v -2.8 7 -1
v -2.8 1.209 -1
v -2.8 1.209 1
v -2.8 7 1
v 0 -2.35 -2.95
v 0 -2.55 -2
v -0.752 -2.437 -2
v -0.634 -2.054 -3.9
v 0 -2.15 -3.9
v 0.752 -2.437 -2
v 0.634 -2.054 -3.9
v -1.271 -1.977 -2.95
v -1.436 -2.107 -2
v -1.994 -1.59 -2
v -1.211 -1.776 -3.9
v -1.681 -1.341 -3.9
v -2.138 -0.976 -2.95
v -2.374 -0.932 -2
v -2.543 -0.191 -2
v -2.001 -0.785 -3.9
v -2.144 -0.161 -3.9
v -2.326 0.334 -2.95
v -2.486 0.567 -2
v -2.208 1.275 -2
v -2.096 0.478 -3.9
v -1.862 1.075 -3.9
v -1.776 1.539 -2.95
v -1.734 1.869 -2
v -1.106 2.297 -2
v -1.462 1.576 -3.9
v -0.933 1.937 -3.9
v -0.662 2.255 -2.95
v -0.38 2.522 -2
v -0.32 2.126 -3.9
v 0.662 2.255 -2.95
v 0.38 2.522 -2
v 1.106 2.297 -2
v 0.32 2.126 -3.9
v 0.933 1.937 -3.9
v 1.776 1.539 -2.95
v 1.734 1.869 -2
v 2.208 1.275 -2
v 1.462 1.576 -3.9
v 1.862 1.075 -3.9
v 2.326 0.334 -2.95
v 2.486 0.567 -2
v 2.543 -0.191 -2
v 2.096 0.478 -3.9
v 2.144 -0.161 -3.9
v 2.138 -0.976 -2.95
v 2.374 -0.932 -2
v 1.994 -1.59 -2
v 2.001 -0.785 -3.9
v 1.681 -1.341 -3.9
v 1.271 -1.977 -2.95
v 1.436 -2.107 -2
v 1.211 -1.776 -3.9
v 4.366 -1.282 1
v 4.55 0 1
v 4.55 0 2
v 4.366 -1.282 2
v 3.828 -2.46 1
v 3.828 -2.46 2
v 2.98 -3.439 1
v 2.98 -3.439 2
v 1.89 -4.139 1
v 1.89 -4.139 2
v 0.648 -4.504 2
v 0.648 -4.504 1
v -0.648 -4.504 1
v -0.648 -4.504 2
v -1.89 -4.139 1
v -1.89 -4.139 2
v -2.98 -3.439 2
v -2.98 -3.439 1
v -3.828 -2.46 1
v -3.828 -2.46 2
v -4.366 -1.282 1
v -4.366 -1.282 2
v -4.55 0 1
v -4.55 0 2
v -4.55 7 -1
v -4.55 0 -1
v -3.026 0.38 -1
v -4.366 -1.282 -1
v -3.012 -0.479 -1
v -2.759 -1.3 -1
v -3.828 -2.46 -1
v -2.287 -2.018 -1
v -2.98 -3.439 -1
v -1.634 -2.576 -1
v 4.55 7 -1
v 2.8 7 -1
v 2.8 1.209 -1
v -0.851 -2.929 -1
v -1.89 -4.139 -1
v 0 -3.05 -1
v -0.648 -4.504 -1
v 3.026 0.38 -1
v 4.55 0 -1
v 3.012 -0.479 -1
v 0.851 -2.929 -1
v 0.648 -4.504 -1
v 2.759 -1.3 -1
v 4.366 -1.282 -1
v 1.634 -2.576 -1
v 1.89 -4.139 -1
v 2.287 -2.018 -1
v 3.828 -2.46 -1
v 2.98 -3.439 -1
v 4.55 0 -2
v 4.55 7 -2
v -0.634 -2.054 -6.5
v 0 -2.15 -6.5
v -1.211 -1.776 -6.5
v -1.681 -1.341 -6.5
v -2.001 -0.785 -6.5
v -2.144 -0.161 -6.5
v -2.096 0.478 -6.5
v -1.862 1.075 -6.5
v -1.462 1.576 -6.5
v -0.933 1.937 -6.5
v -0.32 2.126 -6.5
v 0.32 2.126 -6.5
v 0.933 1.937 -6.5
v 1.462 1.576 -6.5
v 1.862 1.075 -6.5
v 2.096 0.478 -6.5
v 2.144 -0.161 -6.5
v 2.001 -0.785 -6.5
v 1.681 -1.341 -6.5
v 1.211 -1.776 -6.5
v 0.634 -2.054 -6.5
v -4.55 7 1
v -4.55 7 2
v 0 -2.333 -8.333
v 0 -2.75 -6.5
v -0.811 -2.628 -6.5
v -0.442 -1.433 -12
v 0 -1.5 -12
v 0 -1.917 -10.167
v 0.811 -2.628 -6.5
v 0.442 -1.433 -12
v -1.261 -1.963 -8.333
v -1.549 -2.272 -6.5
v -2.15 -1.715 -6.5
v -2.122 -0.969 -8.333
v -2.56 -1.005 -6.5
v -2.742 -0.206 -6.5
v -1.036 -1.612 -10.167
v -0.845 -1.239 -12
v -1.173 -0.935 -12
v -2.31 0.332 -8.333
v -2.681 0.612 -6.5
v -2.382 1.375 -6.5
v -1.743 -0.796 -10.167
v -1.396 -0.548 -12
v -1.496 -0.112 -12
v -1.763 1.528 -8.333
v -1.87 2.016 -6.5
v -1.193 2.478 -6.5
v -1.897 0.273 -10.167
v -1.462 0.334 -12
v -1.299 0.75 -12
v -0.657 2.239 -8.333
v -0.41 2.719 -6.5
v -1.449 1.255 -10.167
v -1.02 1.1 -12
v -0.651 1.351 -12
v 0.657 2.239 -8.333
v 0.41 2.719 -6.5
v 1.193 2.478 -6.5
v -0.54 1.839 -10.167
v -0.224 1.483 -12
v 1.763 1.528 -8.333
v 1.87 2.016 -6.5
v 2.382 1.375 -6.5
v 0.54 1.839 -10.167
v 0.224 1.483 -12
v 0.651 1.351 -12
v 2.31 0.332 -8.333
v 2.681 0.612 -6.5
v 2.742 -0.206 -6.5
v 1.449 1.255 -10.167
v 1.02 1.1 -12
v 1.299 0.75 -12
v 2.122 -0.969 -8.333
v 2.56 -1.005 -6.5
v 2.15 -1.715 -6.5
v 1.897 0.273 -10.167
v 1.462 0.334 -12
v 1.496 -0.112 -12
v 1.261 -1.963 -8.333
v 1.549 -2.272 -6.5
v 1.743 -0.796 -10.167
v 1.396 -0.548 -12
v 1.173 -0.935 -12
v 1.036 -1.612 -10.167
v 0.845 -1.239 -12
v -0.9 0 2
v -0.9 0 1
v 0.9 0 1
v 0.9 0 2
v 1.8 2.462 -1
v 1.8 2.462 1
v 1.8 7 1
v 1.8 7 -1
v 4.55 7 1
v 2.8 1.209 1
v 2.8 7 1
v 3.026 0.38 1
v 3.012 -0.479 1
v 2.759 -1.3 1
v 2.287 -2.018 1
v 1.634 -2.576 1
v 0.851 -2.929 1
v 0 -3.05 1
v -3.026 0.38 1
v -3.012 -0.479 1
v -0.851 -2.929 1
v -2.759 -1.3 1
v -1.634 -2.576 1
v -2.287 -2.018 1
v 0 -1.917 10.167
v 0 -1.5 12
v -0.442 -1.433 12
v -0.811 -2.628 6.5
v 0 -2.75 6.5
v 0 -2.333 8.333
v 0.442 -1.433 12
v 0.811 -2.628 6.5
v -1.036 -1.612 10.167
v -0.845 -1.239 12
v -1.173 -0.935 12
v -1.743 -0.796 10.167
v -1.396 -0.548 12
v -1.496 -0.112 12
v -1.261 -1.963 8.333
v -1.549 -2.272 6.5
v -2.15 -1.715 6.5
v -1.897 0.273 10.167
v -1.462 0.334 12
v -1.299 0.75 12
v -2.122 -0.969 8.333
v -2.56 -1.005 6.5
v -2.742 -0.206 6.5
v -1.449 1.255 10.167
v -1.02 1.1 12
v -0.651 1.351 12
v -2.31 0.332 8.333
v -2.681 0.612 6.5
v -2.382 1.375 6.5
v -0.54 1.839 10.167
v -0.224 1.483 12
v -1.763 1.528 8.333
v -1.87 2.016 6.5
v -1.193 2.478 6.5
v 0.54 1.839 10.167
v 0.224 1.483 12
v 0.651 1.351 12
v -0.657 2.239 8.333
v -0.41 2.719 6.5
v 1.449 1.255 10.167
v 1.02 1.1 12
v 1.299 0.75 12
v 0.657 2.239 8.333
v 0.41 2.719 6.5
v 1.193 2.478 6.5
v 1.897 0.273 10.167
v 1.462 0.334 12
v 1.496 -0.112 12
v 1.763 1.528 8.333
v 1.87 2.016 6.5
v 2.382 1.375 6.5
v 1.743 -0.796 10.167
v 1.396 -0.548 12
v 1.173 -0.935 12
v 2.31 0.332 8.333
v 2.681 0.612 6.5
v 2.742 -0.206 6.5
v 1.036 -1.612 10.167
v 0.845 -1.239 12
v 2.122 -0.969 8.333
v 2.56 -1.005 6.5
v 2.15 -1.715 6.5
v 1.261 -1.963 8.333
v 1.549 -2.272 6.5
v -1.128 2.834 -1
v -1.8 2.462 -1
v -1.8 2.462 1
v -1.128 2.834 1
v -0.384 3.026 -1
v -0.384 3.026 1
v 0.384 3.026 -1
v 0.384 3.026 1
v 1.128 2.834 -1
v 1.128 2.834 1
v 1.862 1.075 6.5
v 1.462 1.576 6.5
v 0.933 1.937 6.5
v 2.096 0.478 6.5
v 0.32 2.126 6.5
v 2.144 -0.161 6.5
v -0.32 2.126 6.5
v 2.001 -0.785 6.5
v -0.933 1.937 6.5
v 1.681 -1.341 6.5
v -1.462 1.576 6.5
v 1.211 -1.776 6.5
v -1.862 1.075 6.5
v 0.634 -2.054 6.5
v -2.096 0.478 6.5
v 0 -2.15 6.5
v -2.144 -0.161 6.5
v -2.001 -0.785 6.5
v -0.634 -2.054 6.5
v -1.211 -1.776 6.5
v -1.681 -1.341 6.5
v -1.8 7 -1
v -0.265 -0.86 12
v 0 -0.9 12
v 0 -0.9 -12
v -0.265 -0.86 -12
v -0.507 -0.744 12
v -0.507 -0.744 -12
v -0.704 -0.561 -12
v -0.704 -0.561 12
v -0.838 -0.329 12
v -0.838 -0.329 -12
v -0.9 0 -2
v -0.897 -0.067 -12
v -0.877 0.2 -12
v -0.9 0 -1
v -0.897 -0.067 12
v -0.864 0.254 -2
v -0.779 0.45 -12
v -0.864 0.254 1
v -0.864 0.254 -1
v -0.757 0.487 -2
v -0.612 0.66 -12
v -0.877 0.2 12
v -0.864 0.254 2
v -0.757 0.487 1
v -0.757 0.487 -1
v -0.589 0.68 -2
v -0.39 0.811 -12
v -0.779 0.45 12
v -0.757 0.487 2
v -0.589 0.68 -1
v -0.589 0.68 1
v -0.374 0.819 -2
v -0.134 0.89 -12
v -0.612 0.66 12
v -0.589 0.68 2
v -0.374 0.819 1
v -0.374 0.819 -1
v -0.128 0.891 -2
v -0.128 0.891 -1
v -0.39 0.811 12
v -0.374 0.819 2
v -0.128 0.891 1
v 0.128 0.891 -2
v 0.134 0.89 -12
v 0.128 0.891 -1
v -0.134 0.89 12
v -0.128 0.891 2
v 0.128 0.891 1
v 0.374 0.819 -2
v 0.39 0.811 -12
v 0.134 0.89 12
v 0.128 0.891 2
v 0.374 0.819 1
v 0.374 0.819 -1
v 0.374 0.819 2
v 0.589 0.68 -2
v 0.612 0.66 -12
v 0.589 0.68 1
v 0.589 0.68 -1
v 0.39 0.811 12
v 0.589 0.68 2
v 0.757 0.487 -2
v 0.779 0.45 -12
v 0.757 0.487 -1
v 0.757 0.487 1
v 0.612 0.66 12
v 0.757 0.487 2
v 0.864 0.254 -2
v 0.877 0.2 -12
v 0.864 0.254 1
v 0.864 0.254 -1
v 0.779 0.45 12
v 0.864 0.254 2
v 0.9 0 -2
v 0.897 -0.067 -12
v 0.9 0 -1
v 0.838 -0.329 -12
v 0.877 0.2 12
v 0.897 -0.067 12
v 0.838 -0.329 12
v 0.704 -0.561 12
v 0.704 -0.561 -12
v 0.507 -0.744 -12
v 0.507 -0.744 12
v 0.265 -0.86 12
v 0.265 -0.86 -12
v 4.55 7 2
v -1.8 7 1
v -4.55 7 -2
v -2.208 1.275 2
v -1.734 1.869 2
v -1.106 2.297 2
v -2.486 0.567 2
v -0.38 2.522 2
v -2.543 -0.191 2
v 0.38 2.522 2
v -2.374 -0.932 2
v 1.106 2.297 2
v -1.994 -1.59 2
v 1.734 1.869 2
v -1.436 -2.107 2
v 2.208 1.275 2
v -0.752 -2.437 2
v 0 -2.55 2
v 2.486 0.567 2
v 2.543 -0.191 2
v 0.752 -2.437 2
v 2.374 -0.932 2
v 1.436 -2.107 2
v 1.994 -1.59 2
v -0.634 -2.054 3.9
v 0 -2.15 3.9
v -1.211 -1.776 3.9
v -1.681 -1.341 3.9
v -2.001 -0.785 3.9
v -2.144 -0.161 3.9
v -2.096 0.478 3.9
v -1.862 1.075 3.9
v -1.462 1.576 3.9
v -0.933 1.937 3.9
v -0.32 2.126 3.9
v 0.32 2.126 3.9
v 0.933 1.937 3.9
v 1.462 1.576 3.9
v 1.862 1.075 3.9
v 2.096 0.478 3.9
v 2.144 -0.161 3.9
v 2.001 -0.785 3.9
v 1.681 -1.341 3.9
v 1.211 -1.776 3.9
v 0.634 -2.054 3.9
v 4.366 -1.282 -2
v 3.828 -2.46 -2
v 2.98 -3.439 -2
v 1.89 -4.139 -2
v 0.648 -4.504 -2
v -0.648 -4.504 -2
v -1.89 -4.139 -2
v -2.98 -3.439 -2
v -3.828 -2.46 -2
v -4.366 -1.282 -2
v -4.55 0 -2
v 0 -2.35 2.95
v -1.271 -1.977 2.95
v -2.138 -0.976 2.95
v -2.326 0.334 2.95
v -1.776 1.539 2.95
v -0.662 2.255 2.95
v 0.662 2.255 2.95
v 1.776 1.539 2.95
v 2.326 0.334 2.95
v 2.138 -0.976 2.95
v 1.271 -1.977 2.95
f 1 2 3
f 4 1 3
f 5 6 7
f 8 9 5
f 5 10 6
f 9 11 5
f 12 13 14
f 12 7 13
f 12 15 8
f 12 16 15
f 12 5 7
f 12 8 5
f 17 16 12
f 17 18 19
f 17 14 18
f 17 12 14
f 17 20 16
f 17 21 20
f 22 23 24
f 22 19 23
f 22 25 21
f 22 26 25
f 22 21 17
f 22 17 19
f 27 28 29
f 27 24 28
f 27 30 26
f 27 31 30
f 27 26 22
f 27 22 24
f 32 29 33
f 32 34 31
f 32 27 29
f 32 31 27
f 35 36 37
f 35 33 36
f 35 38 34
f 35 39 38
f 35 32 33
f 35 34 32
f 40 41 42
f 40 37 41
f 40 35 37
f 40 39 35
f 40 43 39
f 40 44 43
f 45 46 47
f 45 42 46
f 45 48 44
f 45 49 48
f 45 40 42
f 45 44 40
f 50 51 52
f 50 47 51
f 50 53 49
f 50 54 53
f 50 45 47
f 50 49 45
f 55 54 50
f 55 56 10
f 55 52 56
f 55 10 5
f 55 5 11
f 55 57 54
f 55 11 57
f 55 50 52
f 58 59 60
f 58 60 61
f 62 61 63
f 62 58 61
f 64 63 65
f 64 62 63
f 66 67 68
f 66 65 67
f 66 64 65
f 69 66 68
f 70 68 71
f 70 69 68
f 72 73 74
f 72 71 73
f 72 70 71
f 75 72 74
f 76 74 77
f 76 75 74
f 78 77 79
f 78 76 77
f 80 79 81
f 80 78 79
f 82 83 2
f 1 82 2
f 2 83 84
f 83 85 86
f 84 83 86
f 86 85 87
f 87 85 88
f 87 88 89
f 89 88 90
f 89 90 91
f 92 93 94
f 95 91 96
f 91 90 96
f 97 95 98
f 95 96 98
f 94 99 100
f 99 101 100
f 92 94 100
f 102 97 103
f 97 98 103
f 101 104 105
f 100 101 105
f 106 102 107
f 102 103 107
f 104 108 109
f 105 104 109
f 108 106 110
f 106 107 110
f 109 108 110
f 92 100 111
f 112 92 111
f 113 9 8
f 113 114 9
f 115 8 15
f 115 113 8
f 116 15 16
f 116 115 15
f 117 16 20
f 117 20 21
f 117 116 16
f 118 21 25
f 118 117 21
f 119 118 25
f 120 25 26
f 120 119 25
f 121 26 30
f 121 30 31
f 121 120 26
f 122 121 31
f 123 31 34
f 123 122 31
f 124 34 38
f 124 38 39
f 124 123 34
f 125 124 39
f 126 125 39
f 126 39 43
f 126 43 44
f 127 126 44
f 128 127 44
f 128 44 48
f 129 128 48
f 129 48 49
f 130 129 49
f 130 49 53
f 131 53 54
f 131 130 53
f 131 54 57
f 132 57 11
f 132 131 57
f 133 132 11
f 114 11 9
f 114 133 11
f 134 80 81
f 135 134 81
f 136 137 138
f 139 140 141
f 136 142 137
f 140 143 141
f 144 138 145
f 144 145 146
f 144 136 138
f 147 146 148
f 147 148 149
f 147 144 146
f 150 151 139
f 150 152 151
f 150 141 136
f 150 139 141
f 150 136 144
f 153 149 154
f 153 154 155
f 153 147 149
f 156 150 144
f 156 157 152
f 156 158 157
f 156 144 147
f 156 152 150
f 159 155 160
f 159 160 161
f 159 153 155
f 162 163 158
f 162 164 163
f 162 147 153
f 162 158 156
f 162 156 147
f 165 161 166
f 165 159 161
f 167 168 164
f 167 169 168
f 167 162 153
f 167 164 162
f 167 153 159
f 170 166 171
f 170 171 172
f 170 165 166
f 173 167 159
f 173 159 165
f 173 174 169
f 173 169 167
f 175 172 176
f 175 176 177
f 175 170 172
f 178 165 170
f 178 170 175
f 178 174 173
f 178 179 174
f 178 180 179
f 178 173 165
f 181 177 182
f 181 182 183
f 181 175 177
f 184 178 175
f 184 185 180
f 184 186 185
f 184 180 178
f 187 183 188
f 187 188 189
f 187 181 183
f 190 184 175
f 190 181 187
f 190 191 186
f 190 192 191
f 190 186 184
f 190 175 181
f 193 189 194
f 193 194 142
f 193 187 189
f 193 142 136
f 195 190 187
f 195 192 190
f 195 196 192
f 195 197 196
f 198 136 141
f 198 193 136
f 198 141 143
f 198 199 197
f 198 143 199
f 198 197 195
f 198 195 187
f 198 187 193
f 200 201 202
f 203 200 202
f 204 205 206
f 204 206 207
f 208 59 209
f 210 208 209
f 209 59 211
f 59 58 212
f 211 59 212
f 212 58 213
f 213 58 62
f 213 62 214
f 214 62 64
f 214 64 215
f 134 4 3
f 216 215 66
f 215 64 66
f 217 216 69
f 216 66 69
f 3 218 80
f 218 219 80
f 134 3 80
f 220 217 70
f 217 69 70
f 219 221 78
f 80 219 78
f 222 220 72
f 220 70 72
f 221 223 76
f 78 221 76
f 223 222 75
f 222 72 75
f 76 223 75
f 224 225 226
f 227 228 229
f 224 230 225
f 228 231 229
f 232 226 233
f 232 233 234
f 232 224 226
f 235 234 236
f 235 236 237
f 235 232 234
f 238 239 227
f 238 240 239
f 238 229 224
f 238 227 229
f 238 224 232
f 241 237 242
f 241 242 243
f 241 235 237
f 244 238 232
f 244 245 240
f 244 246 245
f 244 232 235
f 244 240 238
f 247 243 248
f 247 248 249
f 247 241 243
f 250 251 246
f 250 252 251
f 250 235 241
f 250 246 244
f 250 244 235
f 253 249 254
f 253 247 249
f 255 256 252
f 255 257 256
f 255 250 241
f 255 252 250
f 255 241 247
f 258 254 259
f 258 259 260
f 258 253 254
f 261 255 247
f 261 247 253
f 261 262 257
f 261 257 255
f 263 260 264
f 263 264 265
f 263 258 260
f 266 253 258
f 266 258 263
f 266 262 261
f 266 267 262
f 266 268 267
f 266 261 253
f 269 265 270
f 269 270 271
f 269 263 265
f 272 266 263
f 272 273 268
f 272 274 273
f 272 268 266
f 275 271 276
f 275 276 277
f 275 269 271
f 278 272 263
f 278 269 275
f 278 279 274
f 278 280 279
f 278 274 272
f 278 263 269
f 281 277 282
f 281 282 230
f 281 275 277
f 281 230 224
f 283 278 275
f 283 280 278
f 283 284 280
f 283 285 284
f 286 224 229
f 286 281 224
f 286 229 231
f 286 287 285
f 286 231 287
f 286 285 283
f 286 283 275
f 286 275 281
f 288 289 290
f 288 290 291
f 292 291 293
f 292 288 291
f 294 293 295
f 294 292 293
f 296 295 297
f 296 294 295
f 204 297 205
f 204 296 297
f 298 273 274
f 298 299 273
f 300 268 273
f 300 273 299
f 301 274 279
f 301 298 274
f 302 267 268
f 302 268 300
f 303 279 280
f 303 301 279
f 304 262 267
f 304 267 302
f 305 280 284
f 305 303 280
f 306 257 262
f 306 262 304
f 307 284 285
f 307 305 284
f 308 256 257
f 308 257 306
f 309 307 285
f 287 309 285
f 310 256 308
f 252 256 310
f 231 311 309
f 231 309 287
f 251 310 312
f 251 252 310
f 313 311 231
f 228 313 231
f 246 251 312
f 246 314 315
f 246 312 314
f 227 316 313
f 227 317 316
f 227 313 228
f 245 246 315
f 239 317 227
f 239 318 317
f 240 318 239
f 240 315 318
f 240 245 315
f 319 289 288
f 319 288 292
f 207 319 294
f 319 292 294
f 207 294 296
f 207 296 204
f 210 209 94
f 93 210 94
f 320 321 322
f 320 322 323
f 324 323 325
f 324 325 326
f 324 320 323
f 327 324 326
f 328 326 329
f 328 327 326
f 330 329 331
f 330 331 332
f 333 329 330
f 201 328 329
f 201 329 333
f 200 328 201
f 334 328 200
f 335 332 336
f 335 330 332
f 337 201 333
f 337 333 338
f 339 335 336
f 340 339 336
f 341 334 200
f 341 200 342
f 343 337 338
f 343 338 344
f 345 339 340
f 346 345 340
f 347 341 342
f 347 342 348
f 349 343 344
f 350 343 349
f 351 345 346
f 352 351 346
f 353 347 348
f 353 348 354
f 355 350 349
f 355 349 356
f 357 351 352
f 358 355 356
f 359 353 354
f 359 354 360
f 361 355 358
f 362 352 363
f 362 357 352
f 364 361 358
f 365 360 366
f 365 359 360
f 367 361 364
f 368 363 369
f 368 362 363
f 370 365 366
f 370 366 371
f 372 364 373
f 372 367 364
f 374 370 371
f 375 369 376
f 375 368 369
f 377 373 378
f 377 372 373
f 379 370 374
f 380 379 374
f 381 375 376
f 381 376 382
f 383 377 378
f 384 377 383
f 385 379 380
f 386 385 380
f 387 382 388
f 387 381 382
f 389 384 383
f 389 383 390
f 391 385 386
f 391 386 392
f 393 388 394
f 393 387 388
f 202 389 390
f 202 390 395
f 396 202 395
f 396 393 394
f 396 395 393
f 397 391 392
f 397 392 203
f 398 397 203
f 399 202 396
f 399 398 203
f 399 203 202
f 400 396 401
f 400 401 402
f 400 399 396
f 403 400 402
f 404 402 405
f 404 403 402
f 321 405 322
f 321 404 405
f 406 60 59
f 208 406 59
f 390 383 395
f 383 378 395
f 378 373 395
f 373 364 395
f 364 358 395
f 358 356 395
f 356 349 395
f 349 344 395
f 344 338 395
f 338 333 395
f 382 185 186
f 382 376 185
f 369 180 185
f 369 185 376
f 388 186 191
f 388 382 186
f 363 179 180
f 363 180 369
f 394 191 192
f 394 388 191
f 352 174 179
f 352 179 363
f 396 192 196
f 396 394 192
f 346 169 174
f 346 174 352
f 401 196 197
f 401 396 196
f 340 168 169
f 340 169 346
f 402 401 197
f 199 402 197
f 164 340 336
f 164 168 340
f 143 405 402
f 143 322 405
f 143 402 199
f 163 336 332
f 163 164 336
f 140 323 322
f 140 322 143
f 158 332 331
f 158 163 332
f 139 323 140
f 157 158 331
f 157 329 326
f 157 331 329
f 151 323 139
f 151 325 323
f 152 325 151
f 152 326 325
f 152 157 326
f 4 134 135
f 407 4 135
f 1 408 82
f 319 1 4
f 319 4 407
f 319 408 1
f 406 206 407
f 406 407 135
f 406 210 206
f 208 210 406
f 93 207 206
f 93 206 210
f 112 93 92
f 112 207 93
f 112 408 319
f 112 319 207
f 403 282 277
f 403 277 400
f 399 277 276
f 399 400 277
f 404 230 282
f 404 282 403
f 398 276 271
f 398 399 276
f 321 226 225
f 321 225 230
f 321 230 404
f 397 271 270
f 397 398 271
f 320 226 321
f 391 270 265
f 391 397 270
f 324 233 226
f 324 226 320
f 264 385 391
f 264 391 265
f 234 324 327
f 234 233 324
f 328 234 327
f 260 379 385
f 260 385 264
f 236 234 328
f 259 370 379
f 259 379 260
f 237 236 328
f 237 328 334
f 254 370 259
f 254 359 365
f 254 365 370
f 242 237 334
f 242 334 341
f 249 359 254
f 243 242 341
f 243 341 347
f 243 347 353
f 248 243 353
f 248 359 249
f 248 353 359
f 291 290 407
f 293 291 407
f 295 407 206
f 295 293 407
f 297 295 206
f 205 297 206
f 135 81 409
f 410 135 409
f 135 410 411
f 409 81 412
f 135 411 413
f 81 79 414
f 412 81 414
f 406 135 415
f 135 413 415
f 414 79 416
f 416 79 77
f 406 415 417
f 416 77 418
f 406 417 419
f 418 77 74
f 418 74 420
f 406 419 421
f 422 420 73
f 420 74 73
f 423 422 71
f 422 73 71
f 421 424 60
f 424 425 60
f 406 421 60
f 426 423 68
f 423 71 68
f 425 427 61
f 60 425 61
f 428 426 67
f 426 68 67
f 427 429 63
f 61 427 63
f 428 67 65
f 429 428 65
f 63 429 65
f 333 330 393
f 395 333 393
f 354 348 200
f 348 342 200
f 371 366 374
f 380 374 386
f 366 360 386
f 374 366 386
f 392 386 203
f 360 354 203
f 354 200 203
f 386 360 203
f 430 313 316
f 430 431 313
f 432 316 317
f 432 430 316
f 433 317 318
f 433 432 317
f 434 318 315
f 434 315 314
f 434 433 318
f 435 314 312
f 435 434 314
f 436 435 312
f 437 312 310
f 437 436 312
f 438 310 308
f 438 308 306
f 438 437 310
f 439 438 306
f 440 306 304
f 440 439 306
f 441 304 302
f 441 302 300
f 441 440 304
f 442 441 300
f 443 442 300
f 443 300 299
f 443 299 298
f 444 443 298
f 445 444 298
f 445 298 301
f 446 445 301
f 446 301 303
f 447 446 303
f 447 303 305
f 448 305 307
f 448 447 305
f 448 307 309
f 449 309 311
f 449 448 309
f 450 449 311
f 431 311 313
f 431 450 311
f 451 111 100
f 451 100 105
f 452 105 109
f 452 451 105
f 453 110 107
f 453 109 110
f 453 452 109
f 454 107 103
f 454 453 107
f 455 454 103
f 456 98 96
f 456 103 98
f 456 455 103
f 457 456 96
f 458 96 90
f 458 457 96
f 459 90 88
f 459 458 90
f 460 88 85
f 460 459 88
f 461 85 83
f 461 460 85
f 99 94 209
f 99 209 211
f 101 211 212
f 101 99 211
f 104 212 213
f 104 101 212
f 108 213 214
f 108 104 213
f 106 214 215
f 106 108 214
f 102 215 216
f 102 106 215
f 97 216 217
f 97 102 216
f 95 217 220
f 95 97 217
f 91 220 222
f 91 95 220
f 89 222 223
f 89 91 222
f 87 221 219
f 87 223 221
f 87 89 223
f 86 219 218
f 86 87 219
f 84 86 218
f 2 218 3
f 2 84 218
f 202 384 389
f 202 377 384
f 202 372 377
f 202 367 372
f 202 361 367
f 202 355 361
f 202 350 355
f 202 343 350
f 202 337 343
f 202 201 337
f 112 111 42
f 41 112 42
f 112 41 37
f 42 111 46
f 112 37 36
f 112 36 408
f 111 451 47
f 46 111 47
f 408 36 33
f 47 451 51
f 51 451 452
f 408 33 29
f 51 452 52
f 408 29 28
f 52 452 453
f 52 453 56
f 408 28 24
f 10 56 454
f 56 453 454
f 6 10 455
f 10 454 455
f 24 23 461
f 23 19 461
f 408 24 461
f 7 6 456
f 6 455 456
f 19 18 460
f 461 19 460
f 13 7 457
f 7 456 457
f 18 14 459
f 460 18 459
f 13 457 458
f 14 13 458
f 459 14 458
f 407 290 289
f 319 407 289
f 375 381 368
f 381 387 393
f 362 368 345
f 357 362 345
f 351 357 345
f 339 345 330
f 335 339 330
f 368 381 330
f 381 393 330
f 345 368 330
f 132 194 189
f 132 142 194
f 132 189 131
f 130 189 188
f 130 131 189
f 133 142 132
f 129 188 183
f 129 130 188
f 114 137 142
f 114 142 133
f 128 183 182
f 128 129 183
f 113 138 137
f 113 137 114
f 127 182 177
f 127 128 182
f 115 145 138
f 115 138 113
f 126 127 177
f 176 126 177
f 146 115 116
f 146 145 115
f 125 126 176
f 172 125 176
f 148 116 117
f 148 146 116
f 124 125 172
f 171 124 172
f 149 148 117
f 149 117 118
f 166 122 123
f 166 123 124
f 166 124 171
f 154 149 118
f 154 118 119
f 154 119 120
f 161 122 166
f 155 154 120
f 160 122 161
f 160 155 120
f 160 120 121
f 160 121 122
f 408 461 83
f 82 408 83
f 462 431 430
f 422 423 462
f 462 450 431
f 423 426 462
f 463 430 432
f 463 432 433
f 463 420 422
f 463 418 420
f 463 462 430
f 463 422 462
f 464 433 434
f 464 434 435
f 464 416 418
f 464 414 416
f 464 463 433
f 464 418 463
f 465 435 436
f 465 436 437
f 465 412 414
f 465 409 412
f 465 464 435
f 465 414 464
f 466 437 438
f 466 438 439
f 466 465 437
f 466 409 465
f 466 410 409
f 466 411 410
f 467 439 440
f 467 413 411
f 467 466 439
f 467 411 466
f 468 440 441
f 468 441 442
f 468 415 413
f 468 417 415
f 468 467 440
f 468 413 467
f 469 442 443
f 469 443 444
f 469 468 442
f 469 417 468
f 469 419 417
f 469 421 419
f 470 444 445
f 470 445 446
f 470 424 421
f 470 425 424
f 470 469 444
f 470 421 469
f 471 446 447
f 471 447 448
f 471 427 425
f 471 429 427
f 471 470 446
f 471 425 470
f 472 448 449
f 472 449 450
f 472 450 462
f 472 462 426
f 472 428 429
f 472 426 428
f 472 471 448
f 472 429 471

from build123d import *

# Parameters (mm, degrees)
SKETCH2_W           = 3.6
SKETCH2_H           = 2
BOSS_EXTRUDE1_DEPTH = 7


with BuildPart() as part:
    # Sketch1 → Revolve1 (revolve)
    with BuildSketch(Plane(origin=(0, 0, 0), x_dir=(0, 0, -1), z_dir=(1, 0, 0)), mode=Mode.PRIVATE) as revolve1_sk:
        Polygon((6.5, 2.75), (12, 1.5), (12, 0.9), (-12, 0.9), (-12, 1.5), (-6.5, 2.75), (-6.5, 2.15), (-3.9, 2.15), (-2, 2.55), (-2, 4.55), (-1, 4.55), (-1, 3.05), (1, 3.05), (1, 4.55), (2, 4.55), (2, 2.55), (3.9, 2.15), (6.5, 2.15), align=None)
    revolve(revolve1_sk.sketch.rotate(Axis((0, 0, 12), (0, 0, -1)), 180), axis=Axis((0, 0, 12), (0, 0, -1)))

    # Sketch2 → Boss-Extrude1 (add)
    with BuildSketch(Plane(origin=(0, 0, 0), x_dir=(1, 0, 0), z_dir=(0, 1, 0))):
        Polygon((-4.55, 2), (-4.55, 1), (-2.8, 1), (-2.8, -1), (-4.55, -1), (-4.55, -2), (4.55, -2), (4.55, -1), (2.8, -1), (2.8, 1), (4.55, 1), (4.55, 2), align=None)
        Rectangle(SKETCH2_W, SKETCH2_H, mode=Mode.SUBTRACT)
    extrude(amount=BOSS_EXTRUDE1_DEPTH)


solid = part.part
